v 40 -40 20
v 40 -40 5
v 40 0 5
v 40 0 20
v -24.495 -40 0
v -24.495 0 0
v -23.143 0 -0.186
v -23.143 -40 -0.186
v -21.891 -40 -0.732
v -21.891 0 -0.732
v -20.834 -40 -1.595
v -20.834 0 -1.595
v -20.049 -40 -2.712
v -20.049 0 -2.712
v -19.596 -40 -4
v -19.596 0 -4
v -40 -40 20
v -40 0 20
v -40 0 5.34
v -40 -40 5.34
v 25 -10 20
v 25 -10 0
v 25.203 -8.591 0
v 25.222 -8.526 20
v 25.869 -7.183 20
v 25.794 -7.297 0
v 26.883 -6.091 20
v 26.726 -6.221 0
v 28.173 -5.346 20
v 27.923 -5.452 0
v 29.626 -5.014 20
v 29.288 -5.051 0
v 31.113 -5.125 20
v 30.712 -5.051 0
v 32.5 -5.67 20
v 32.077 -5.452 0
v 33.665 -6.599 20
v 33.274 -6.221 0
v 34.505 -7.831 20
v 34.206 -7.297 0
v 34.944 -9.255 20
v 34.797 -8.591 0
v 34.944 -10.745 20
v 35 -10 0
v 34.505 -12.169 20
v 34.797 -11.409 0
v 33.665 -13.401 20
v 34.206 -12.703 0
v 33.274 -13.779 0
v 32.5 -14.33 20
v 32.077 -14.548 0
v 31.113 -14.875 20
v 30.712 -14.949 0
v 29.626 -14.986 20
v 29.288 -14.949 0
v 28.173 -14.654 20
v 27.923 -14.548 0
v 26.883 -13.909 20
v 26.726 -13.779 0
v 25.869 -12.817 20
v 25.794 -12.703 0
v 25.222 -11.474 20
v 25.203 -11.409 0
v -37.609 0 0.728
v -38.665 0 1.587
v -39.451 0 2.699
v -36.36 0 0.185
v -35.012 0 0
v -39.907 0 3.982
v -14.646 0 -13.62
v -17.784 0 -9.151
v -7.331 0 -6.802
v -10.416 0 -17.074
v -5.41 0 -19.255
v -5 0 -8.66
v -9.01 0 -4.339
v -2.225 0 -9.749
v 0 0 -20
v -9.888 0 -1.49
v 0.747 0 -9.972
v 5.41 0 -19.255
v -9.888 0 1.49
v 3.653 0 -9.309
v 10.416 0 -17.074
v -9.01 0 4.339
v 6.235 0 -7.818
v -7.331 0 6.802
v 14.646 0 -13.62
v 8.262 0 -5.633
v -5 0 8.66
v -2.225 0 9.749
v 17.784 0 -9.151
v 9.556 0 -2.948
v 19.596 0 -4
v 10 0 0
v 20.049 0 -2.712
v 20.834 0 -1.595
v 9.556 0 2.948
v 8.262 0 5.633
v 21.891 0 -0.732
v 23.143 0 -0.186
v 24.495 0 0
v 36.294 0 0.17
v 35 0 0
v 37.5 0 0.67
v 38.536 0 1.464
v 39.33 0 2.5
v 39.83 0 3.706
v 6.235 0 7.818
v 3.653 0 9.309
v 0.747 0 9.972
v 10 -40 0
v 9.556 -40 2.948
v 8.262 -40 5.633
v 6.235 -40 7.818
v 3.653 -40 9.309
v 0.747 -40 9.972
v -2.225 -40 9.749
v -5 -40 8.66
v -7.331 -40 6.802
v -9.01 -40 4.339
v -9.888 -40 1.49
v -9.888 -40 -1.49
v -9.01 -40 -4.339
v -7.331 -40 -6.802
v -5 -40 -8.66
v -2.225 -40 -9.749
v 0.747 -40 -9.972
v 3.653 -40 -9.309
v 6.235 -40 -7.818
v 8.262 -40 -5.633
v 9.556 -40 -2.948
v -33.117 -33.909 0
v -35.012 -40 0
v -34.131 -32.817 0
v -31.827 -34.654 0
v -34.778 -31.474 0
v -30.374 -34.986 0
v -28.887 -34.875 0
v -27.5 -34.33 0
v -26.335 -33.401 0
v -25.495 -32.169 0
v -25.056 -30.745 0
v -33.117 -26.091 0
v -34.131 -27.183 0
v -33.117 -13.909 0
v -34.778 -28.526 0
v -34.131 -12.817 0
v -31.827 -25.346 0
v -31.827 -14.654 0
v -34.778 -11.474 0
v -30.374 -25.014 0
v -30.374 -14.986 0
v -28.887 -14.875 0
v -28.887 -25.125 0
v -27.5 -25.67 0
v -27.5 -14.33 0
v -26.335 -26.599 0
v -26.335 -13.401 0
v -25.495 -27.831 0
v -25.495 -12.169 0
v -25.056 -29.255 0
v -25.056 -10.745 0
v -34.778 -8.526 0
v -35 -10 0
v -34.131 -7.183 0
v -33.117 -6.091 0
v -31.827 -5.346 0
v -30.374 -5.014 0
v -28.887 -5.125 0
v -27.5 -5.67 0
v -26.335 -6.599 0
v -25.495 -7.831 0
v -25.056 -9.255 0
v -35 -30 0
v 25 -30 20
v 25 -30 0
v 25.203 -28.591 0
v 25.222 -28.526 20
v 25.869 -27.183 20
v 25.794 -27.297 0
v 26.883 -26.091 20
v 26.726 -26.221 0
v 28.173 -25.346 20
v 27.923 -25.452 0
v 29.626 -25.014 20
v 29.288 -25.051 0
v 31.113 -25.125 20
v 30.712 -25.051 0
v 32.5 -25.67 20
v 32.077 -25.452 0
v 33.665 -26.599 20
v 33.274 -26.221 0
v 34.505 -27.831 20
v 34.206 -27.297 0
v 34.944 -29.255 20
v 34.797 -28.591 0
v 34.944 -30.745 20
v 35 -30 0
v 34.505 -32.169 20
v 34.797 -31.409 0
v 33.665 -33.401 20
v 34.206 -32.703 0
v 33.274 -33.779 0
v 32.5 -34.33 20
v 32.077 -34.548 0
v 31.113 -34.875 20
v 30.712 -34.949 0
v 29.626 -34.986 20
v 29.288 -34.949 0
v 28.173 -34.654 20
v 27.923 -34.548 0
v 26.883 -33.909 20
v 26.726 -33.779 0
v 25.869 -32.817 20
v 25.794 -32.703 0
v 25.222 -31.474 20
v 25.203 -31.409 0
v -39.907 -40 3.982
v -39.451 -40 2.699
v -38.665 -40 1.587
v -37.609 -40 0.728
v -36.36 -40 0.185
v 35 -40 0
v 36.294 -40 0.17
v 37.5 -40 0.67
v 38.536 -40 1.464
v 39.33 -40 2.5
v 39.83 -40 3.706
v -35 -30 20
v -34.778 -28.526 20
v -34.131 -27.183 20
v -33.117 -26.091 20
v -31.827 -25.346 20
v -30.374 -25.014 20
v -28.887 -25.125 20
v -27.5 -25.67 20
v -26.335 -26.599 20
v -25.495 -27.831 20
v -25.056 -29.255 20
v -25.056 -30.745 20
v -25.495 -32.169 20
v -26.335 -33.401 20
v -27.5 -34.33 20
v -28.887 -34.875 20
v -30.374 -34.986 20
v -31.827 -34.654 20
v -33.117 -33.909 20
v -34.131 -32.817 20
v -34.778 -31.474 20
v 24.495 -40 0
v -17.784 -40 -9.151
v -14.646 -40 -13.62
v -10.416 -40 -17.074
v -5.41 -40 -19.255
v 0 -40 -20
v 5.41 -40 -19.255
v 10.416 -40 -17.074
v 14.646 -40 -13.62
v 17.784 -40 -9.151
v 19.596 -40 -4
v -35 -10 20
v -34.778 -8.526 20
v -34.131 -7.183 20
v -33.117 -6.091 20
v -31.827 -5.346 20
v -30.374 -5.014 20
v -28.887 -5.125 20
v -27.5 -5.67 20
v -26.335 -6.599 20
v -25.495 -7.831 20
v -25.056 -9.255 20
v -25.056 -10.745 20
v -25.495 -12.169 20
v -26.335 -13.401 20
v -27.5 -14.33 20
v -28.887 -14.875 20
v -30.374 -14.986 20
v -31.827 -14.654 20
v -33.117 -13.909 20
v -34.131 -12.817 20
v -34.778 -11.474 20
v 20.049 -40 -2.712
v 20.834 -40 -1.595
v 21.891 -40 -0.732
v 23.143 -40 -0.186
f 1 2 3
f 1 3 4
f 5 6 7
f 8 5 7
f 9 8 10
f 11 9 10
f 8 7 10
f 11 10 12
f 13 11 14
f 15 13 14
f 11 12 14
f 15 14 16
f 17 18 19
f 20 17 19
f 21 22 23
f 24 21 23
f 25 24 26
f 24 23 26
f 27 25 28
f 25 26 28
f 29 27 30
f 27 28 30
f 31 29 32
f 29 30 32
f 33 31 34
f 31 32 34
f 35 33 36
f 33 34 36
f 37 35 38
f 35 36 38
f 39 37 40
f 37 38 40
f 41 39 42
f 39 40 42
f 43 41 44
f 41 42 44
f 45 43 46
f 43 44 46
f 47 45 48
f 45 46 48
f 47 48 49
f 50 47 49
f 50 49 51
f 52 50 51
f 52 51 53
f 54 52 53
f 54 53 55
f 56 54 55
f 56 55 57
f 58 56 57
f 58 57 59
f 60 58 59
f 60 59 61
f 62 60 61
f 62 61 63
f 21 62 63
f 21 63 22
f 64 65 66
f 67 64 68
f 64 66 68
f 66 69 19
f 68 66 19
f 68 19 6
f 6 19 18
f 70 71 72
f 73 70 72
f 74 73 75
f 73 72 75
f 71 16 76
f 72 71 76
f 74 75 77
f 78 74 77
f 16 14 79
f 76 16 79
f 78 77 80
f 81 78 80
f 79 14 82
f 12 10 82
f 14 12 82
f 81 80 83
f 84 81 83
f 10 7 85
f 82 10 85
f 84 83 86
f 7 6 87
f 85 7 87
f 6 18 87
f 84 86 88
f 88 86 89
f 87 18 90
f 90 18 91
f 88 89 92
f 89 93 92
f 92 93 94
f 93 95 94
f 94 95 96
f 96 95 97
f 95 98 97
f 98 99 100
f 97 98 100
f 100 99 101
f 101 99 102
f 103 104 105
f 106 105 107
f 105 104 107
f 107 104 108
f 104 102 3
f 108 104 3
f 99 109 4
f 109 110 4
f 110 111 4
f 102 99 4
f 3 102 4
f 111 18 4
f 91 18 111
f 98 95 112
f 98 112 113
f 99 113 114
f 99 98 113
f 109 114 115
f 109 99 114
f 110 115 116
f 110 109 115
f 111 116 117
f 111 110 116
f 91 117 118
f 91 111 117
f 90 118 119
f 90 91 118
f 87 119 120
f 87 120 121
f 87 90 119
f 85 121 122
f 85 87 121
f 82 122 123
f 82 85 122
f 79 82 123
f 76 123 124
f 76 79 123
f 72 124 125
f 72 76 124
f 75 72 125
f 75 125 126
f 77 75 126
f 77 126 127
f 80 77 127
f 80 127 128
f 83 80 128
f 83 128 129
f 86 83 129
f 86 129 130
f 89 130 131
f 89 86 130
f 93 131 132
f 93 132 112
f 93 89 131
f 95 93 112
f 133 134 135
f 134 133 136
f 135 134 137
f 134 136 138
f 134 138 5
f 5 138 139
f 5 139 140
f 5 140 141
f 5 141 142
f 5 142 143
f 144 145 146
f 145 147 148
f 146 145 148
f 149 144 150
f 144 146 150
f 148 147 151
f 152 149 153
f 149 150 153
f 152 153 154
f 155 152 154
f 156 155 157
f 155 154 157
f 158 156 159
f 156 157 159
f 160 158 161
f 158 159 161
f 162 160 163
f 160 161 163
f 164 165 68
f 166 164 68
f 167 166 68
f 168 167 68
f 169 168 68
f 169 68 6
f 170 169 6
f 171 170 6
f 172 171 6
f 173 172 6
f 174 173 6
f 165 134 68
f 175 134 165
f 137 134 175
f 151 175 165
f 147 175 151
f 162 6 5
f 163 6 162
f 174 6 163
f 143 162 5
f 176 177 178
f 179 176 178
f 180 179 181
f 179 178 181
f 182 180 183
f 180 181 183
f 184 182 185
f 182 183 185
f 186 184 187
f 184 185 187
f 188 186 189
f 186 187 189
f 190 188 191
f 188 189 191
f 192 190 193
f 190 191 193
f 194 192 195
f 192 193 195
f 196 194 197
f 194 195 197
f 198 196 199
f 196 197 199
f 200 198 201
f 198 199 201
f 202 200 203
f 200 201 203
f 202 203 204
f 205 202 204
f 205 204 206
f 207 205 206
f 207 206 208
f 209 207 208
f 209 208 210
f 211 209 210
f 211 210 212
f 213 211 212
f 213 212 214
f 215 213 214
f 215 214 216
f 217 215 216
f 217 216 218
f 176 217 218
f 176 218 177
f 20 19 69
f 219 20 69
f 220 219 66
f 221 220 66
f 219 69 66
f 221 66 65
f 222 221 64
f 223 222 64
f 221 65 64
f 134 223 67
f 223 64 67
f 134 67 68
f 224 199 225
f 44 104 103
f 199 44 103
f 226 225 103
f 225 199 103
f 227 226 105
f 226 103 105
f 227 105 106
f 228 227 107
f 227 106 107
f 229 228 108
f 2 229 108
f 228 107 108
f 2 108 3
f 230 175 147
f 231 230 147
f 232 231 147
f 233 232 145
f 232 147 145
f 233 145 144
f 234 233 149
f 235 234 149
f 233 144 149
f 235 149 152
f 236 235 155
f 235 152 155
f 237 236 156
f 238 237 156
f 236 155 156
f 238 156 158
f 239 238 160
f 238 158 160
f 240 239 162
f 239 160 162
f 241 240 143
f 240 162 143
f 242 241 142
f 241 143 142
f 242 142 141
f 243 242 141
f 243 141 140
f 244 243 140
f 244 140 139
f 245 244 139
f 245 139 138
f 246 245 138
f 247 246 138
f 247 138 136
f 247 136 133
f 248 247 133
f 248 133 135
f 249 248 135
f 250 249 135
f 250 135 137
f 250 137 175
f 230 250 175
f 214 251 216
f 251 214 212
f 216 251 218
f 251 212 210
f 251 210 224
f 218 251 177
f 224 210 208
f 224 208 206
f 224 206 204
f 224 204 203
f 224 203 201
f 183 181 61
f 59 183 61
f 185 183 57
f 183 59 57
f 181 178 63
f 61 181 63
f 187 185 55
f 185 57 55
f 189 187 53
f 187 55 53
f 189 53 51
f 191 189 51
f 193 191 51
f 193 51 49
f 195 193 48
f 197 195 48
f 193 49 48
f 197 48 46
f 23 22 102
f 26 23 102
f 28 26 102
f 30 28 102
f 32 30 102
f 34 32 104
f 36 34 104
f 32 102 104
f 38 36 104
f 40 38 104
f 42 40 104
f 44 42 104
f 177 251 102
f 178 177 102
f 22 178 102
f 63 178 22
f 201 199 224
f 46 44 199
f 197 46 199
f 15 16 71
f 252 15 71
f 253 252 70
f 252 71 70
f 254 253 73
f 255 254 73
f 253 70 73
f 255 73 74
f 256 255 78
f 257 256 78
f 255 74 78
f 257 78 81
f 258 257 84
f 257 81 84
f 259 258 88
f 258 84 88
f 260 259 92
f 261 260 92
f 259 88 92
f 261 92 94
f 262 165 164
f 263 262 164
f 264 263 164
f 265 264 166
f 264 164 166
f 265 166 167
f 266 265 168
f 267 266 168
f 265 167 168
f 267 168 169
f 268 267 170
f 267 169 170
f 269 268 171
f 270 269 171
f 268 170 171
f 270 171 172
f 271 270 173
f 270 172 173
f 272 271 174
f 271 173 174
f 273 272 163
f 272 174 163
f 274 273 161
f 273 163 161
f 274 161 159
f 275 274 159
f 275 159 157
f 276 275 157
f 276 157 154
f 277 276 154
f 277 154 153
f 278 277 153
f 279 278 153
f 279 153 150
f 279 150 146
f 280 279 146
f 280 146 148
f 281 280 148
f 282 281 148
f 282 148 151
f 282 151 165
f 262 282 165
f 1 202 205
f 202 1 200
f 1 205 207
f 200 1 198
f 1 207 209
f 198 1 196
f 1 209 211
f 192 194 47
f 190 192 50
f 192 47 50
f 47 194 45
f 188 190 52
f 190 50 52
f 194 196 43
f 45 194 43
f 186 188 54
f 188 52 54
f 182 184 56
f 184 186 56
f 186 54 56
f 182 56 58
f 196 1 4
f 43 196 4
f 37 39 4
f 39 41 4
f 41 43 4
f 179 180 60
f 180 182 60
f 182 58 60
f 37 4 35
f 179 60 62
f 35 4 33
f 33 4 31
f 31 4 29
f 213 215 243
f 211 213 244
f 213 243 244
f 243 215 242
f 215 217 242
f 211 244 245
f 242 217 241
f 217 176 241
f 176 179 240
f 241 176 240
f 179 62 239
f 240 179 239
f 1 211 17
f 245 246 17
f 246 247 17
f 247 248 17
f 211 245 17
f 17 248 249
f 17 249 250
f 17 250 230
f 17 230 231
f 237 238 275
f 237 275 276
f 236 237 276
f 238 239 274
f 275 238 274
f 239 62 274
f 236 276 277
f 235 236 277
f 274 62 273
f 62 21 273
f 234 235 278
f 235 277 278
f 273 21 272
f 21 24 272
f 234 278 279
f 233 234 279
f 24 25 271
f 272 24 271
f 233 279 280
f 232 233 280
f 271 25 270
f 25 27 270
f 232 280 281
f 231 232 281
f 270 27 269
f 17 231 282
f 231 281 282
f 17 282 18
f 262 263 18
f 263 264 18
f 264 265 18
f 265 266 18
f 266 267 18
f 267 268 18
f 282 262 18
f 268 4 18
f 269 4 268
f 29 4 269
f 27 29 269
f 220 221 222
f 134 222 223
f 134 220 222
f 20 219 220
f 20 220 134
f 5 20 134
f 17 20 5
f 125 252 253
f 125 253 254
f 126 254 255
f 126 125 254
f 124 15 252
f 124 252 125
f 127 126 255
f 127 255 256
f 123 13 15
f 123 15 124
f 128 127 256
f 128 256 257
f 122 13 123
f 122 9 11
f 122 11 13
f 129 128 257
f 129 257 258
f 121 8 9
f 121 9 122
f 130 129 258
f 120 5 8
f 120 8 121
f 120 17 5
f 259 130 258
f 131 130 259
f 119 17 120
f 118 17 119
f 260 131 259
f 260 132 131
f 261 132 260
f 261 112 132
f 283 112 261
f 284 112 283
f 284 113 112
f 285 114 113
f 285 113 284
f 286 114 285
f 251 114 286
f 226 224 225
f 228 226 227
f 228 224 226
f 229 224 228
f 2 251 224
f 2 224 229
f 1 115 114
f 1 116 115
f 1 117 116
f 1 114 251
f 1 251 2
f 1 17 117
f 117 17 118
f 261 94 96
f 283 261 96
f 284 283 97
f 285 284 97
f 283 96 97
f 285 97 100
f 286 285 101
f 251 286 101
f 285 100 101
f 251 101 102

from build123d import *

# Parameters (mm, degrees)
F0_R     = 10
F1_DEPTH = 40
F3_D     = 10


# Not quite as in the source:
# - a feature names something its author has since deleted; it is built from what else it names


with BuildPart() as f1:
    # F0 (on Front) → F1 (new body)
    with BuildSketch(Plane.XZ):
        with BuildLine():
            ThreePointArc((-24.4948974278, 0), (-21.3326197677, -1.1270166538), (-19.5959179423, -4))
            ThreePointArc((-19.5959179423, -4), (0, -20), (19.5959179423, -4))
            ThreePointArc((19.5959179423, -4), (21.3326197677, -1.1270166538), (24.4948974278, 0))
            Line((24.4948974278, 0), (35, 0))
            ThreePointArc((35, 0), (38.5355339059, 1.4644660941), (40, 5))
            Line((40, 5), (40, 20))
            Line((40, 20), (-40, 20))
            Line((-40, 20), (-40, 5.3399834782))
            ThreePointArc((-40, 5.3399834782), (-38.6653317972, 1.5867843161), (-35.0115722683, 0))
            Line((-35.0115722683, 0), (-24.4948974278, 0))
        make_face()
        Circle(F0_R, mode=Mode.SUBTRACT)
    extrude(amount=F1_DEPTH)

    # F3 (through all)
    with Locations(Plane.XY.offset(20)):
        with Locations((-30, -10), (-29.9999981744, -30), (30, -30), (30, -10)):
            Hole(F3_D / 2)


solid = f1.part
